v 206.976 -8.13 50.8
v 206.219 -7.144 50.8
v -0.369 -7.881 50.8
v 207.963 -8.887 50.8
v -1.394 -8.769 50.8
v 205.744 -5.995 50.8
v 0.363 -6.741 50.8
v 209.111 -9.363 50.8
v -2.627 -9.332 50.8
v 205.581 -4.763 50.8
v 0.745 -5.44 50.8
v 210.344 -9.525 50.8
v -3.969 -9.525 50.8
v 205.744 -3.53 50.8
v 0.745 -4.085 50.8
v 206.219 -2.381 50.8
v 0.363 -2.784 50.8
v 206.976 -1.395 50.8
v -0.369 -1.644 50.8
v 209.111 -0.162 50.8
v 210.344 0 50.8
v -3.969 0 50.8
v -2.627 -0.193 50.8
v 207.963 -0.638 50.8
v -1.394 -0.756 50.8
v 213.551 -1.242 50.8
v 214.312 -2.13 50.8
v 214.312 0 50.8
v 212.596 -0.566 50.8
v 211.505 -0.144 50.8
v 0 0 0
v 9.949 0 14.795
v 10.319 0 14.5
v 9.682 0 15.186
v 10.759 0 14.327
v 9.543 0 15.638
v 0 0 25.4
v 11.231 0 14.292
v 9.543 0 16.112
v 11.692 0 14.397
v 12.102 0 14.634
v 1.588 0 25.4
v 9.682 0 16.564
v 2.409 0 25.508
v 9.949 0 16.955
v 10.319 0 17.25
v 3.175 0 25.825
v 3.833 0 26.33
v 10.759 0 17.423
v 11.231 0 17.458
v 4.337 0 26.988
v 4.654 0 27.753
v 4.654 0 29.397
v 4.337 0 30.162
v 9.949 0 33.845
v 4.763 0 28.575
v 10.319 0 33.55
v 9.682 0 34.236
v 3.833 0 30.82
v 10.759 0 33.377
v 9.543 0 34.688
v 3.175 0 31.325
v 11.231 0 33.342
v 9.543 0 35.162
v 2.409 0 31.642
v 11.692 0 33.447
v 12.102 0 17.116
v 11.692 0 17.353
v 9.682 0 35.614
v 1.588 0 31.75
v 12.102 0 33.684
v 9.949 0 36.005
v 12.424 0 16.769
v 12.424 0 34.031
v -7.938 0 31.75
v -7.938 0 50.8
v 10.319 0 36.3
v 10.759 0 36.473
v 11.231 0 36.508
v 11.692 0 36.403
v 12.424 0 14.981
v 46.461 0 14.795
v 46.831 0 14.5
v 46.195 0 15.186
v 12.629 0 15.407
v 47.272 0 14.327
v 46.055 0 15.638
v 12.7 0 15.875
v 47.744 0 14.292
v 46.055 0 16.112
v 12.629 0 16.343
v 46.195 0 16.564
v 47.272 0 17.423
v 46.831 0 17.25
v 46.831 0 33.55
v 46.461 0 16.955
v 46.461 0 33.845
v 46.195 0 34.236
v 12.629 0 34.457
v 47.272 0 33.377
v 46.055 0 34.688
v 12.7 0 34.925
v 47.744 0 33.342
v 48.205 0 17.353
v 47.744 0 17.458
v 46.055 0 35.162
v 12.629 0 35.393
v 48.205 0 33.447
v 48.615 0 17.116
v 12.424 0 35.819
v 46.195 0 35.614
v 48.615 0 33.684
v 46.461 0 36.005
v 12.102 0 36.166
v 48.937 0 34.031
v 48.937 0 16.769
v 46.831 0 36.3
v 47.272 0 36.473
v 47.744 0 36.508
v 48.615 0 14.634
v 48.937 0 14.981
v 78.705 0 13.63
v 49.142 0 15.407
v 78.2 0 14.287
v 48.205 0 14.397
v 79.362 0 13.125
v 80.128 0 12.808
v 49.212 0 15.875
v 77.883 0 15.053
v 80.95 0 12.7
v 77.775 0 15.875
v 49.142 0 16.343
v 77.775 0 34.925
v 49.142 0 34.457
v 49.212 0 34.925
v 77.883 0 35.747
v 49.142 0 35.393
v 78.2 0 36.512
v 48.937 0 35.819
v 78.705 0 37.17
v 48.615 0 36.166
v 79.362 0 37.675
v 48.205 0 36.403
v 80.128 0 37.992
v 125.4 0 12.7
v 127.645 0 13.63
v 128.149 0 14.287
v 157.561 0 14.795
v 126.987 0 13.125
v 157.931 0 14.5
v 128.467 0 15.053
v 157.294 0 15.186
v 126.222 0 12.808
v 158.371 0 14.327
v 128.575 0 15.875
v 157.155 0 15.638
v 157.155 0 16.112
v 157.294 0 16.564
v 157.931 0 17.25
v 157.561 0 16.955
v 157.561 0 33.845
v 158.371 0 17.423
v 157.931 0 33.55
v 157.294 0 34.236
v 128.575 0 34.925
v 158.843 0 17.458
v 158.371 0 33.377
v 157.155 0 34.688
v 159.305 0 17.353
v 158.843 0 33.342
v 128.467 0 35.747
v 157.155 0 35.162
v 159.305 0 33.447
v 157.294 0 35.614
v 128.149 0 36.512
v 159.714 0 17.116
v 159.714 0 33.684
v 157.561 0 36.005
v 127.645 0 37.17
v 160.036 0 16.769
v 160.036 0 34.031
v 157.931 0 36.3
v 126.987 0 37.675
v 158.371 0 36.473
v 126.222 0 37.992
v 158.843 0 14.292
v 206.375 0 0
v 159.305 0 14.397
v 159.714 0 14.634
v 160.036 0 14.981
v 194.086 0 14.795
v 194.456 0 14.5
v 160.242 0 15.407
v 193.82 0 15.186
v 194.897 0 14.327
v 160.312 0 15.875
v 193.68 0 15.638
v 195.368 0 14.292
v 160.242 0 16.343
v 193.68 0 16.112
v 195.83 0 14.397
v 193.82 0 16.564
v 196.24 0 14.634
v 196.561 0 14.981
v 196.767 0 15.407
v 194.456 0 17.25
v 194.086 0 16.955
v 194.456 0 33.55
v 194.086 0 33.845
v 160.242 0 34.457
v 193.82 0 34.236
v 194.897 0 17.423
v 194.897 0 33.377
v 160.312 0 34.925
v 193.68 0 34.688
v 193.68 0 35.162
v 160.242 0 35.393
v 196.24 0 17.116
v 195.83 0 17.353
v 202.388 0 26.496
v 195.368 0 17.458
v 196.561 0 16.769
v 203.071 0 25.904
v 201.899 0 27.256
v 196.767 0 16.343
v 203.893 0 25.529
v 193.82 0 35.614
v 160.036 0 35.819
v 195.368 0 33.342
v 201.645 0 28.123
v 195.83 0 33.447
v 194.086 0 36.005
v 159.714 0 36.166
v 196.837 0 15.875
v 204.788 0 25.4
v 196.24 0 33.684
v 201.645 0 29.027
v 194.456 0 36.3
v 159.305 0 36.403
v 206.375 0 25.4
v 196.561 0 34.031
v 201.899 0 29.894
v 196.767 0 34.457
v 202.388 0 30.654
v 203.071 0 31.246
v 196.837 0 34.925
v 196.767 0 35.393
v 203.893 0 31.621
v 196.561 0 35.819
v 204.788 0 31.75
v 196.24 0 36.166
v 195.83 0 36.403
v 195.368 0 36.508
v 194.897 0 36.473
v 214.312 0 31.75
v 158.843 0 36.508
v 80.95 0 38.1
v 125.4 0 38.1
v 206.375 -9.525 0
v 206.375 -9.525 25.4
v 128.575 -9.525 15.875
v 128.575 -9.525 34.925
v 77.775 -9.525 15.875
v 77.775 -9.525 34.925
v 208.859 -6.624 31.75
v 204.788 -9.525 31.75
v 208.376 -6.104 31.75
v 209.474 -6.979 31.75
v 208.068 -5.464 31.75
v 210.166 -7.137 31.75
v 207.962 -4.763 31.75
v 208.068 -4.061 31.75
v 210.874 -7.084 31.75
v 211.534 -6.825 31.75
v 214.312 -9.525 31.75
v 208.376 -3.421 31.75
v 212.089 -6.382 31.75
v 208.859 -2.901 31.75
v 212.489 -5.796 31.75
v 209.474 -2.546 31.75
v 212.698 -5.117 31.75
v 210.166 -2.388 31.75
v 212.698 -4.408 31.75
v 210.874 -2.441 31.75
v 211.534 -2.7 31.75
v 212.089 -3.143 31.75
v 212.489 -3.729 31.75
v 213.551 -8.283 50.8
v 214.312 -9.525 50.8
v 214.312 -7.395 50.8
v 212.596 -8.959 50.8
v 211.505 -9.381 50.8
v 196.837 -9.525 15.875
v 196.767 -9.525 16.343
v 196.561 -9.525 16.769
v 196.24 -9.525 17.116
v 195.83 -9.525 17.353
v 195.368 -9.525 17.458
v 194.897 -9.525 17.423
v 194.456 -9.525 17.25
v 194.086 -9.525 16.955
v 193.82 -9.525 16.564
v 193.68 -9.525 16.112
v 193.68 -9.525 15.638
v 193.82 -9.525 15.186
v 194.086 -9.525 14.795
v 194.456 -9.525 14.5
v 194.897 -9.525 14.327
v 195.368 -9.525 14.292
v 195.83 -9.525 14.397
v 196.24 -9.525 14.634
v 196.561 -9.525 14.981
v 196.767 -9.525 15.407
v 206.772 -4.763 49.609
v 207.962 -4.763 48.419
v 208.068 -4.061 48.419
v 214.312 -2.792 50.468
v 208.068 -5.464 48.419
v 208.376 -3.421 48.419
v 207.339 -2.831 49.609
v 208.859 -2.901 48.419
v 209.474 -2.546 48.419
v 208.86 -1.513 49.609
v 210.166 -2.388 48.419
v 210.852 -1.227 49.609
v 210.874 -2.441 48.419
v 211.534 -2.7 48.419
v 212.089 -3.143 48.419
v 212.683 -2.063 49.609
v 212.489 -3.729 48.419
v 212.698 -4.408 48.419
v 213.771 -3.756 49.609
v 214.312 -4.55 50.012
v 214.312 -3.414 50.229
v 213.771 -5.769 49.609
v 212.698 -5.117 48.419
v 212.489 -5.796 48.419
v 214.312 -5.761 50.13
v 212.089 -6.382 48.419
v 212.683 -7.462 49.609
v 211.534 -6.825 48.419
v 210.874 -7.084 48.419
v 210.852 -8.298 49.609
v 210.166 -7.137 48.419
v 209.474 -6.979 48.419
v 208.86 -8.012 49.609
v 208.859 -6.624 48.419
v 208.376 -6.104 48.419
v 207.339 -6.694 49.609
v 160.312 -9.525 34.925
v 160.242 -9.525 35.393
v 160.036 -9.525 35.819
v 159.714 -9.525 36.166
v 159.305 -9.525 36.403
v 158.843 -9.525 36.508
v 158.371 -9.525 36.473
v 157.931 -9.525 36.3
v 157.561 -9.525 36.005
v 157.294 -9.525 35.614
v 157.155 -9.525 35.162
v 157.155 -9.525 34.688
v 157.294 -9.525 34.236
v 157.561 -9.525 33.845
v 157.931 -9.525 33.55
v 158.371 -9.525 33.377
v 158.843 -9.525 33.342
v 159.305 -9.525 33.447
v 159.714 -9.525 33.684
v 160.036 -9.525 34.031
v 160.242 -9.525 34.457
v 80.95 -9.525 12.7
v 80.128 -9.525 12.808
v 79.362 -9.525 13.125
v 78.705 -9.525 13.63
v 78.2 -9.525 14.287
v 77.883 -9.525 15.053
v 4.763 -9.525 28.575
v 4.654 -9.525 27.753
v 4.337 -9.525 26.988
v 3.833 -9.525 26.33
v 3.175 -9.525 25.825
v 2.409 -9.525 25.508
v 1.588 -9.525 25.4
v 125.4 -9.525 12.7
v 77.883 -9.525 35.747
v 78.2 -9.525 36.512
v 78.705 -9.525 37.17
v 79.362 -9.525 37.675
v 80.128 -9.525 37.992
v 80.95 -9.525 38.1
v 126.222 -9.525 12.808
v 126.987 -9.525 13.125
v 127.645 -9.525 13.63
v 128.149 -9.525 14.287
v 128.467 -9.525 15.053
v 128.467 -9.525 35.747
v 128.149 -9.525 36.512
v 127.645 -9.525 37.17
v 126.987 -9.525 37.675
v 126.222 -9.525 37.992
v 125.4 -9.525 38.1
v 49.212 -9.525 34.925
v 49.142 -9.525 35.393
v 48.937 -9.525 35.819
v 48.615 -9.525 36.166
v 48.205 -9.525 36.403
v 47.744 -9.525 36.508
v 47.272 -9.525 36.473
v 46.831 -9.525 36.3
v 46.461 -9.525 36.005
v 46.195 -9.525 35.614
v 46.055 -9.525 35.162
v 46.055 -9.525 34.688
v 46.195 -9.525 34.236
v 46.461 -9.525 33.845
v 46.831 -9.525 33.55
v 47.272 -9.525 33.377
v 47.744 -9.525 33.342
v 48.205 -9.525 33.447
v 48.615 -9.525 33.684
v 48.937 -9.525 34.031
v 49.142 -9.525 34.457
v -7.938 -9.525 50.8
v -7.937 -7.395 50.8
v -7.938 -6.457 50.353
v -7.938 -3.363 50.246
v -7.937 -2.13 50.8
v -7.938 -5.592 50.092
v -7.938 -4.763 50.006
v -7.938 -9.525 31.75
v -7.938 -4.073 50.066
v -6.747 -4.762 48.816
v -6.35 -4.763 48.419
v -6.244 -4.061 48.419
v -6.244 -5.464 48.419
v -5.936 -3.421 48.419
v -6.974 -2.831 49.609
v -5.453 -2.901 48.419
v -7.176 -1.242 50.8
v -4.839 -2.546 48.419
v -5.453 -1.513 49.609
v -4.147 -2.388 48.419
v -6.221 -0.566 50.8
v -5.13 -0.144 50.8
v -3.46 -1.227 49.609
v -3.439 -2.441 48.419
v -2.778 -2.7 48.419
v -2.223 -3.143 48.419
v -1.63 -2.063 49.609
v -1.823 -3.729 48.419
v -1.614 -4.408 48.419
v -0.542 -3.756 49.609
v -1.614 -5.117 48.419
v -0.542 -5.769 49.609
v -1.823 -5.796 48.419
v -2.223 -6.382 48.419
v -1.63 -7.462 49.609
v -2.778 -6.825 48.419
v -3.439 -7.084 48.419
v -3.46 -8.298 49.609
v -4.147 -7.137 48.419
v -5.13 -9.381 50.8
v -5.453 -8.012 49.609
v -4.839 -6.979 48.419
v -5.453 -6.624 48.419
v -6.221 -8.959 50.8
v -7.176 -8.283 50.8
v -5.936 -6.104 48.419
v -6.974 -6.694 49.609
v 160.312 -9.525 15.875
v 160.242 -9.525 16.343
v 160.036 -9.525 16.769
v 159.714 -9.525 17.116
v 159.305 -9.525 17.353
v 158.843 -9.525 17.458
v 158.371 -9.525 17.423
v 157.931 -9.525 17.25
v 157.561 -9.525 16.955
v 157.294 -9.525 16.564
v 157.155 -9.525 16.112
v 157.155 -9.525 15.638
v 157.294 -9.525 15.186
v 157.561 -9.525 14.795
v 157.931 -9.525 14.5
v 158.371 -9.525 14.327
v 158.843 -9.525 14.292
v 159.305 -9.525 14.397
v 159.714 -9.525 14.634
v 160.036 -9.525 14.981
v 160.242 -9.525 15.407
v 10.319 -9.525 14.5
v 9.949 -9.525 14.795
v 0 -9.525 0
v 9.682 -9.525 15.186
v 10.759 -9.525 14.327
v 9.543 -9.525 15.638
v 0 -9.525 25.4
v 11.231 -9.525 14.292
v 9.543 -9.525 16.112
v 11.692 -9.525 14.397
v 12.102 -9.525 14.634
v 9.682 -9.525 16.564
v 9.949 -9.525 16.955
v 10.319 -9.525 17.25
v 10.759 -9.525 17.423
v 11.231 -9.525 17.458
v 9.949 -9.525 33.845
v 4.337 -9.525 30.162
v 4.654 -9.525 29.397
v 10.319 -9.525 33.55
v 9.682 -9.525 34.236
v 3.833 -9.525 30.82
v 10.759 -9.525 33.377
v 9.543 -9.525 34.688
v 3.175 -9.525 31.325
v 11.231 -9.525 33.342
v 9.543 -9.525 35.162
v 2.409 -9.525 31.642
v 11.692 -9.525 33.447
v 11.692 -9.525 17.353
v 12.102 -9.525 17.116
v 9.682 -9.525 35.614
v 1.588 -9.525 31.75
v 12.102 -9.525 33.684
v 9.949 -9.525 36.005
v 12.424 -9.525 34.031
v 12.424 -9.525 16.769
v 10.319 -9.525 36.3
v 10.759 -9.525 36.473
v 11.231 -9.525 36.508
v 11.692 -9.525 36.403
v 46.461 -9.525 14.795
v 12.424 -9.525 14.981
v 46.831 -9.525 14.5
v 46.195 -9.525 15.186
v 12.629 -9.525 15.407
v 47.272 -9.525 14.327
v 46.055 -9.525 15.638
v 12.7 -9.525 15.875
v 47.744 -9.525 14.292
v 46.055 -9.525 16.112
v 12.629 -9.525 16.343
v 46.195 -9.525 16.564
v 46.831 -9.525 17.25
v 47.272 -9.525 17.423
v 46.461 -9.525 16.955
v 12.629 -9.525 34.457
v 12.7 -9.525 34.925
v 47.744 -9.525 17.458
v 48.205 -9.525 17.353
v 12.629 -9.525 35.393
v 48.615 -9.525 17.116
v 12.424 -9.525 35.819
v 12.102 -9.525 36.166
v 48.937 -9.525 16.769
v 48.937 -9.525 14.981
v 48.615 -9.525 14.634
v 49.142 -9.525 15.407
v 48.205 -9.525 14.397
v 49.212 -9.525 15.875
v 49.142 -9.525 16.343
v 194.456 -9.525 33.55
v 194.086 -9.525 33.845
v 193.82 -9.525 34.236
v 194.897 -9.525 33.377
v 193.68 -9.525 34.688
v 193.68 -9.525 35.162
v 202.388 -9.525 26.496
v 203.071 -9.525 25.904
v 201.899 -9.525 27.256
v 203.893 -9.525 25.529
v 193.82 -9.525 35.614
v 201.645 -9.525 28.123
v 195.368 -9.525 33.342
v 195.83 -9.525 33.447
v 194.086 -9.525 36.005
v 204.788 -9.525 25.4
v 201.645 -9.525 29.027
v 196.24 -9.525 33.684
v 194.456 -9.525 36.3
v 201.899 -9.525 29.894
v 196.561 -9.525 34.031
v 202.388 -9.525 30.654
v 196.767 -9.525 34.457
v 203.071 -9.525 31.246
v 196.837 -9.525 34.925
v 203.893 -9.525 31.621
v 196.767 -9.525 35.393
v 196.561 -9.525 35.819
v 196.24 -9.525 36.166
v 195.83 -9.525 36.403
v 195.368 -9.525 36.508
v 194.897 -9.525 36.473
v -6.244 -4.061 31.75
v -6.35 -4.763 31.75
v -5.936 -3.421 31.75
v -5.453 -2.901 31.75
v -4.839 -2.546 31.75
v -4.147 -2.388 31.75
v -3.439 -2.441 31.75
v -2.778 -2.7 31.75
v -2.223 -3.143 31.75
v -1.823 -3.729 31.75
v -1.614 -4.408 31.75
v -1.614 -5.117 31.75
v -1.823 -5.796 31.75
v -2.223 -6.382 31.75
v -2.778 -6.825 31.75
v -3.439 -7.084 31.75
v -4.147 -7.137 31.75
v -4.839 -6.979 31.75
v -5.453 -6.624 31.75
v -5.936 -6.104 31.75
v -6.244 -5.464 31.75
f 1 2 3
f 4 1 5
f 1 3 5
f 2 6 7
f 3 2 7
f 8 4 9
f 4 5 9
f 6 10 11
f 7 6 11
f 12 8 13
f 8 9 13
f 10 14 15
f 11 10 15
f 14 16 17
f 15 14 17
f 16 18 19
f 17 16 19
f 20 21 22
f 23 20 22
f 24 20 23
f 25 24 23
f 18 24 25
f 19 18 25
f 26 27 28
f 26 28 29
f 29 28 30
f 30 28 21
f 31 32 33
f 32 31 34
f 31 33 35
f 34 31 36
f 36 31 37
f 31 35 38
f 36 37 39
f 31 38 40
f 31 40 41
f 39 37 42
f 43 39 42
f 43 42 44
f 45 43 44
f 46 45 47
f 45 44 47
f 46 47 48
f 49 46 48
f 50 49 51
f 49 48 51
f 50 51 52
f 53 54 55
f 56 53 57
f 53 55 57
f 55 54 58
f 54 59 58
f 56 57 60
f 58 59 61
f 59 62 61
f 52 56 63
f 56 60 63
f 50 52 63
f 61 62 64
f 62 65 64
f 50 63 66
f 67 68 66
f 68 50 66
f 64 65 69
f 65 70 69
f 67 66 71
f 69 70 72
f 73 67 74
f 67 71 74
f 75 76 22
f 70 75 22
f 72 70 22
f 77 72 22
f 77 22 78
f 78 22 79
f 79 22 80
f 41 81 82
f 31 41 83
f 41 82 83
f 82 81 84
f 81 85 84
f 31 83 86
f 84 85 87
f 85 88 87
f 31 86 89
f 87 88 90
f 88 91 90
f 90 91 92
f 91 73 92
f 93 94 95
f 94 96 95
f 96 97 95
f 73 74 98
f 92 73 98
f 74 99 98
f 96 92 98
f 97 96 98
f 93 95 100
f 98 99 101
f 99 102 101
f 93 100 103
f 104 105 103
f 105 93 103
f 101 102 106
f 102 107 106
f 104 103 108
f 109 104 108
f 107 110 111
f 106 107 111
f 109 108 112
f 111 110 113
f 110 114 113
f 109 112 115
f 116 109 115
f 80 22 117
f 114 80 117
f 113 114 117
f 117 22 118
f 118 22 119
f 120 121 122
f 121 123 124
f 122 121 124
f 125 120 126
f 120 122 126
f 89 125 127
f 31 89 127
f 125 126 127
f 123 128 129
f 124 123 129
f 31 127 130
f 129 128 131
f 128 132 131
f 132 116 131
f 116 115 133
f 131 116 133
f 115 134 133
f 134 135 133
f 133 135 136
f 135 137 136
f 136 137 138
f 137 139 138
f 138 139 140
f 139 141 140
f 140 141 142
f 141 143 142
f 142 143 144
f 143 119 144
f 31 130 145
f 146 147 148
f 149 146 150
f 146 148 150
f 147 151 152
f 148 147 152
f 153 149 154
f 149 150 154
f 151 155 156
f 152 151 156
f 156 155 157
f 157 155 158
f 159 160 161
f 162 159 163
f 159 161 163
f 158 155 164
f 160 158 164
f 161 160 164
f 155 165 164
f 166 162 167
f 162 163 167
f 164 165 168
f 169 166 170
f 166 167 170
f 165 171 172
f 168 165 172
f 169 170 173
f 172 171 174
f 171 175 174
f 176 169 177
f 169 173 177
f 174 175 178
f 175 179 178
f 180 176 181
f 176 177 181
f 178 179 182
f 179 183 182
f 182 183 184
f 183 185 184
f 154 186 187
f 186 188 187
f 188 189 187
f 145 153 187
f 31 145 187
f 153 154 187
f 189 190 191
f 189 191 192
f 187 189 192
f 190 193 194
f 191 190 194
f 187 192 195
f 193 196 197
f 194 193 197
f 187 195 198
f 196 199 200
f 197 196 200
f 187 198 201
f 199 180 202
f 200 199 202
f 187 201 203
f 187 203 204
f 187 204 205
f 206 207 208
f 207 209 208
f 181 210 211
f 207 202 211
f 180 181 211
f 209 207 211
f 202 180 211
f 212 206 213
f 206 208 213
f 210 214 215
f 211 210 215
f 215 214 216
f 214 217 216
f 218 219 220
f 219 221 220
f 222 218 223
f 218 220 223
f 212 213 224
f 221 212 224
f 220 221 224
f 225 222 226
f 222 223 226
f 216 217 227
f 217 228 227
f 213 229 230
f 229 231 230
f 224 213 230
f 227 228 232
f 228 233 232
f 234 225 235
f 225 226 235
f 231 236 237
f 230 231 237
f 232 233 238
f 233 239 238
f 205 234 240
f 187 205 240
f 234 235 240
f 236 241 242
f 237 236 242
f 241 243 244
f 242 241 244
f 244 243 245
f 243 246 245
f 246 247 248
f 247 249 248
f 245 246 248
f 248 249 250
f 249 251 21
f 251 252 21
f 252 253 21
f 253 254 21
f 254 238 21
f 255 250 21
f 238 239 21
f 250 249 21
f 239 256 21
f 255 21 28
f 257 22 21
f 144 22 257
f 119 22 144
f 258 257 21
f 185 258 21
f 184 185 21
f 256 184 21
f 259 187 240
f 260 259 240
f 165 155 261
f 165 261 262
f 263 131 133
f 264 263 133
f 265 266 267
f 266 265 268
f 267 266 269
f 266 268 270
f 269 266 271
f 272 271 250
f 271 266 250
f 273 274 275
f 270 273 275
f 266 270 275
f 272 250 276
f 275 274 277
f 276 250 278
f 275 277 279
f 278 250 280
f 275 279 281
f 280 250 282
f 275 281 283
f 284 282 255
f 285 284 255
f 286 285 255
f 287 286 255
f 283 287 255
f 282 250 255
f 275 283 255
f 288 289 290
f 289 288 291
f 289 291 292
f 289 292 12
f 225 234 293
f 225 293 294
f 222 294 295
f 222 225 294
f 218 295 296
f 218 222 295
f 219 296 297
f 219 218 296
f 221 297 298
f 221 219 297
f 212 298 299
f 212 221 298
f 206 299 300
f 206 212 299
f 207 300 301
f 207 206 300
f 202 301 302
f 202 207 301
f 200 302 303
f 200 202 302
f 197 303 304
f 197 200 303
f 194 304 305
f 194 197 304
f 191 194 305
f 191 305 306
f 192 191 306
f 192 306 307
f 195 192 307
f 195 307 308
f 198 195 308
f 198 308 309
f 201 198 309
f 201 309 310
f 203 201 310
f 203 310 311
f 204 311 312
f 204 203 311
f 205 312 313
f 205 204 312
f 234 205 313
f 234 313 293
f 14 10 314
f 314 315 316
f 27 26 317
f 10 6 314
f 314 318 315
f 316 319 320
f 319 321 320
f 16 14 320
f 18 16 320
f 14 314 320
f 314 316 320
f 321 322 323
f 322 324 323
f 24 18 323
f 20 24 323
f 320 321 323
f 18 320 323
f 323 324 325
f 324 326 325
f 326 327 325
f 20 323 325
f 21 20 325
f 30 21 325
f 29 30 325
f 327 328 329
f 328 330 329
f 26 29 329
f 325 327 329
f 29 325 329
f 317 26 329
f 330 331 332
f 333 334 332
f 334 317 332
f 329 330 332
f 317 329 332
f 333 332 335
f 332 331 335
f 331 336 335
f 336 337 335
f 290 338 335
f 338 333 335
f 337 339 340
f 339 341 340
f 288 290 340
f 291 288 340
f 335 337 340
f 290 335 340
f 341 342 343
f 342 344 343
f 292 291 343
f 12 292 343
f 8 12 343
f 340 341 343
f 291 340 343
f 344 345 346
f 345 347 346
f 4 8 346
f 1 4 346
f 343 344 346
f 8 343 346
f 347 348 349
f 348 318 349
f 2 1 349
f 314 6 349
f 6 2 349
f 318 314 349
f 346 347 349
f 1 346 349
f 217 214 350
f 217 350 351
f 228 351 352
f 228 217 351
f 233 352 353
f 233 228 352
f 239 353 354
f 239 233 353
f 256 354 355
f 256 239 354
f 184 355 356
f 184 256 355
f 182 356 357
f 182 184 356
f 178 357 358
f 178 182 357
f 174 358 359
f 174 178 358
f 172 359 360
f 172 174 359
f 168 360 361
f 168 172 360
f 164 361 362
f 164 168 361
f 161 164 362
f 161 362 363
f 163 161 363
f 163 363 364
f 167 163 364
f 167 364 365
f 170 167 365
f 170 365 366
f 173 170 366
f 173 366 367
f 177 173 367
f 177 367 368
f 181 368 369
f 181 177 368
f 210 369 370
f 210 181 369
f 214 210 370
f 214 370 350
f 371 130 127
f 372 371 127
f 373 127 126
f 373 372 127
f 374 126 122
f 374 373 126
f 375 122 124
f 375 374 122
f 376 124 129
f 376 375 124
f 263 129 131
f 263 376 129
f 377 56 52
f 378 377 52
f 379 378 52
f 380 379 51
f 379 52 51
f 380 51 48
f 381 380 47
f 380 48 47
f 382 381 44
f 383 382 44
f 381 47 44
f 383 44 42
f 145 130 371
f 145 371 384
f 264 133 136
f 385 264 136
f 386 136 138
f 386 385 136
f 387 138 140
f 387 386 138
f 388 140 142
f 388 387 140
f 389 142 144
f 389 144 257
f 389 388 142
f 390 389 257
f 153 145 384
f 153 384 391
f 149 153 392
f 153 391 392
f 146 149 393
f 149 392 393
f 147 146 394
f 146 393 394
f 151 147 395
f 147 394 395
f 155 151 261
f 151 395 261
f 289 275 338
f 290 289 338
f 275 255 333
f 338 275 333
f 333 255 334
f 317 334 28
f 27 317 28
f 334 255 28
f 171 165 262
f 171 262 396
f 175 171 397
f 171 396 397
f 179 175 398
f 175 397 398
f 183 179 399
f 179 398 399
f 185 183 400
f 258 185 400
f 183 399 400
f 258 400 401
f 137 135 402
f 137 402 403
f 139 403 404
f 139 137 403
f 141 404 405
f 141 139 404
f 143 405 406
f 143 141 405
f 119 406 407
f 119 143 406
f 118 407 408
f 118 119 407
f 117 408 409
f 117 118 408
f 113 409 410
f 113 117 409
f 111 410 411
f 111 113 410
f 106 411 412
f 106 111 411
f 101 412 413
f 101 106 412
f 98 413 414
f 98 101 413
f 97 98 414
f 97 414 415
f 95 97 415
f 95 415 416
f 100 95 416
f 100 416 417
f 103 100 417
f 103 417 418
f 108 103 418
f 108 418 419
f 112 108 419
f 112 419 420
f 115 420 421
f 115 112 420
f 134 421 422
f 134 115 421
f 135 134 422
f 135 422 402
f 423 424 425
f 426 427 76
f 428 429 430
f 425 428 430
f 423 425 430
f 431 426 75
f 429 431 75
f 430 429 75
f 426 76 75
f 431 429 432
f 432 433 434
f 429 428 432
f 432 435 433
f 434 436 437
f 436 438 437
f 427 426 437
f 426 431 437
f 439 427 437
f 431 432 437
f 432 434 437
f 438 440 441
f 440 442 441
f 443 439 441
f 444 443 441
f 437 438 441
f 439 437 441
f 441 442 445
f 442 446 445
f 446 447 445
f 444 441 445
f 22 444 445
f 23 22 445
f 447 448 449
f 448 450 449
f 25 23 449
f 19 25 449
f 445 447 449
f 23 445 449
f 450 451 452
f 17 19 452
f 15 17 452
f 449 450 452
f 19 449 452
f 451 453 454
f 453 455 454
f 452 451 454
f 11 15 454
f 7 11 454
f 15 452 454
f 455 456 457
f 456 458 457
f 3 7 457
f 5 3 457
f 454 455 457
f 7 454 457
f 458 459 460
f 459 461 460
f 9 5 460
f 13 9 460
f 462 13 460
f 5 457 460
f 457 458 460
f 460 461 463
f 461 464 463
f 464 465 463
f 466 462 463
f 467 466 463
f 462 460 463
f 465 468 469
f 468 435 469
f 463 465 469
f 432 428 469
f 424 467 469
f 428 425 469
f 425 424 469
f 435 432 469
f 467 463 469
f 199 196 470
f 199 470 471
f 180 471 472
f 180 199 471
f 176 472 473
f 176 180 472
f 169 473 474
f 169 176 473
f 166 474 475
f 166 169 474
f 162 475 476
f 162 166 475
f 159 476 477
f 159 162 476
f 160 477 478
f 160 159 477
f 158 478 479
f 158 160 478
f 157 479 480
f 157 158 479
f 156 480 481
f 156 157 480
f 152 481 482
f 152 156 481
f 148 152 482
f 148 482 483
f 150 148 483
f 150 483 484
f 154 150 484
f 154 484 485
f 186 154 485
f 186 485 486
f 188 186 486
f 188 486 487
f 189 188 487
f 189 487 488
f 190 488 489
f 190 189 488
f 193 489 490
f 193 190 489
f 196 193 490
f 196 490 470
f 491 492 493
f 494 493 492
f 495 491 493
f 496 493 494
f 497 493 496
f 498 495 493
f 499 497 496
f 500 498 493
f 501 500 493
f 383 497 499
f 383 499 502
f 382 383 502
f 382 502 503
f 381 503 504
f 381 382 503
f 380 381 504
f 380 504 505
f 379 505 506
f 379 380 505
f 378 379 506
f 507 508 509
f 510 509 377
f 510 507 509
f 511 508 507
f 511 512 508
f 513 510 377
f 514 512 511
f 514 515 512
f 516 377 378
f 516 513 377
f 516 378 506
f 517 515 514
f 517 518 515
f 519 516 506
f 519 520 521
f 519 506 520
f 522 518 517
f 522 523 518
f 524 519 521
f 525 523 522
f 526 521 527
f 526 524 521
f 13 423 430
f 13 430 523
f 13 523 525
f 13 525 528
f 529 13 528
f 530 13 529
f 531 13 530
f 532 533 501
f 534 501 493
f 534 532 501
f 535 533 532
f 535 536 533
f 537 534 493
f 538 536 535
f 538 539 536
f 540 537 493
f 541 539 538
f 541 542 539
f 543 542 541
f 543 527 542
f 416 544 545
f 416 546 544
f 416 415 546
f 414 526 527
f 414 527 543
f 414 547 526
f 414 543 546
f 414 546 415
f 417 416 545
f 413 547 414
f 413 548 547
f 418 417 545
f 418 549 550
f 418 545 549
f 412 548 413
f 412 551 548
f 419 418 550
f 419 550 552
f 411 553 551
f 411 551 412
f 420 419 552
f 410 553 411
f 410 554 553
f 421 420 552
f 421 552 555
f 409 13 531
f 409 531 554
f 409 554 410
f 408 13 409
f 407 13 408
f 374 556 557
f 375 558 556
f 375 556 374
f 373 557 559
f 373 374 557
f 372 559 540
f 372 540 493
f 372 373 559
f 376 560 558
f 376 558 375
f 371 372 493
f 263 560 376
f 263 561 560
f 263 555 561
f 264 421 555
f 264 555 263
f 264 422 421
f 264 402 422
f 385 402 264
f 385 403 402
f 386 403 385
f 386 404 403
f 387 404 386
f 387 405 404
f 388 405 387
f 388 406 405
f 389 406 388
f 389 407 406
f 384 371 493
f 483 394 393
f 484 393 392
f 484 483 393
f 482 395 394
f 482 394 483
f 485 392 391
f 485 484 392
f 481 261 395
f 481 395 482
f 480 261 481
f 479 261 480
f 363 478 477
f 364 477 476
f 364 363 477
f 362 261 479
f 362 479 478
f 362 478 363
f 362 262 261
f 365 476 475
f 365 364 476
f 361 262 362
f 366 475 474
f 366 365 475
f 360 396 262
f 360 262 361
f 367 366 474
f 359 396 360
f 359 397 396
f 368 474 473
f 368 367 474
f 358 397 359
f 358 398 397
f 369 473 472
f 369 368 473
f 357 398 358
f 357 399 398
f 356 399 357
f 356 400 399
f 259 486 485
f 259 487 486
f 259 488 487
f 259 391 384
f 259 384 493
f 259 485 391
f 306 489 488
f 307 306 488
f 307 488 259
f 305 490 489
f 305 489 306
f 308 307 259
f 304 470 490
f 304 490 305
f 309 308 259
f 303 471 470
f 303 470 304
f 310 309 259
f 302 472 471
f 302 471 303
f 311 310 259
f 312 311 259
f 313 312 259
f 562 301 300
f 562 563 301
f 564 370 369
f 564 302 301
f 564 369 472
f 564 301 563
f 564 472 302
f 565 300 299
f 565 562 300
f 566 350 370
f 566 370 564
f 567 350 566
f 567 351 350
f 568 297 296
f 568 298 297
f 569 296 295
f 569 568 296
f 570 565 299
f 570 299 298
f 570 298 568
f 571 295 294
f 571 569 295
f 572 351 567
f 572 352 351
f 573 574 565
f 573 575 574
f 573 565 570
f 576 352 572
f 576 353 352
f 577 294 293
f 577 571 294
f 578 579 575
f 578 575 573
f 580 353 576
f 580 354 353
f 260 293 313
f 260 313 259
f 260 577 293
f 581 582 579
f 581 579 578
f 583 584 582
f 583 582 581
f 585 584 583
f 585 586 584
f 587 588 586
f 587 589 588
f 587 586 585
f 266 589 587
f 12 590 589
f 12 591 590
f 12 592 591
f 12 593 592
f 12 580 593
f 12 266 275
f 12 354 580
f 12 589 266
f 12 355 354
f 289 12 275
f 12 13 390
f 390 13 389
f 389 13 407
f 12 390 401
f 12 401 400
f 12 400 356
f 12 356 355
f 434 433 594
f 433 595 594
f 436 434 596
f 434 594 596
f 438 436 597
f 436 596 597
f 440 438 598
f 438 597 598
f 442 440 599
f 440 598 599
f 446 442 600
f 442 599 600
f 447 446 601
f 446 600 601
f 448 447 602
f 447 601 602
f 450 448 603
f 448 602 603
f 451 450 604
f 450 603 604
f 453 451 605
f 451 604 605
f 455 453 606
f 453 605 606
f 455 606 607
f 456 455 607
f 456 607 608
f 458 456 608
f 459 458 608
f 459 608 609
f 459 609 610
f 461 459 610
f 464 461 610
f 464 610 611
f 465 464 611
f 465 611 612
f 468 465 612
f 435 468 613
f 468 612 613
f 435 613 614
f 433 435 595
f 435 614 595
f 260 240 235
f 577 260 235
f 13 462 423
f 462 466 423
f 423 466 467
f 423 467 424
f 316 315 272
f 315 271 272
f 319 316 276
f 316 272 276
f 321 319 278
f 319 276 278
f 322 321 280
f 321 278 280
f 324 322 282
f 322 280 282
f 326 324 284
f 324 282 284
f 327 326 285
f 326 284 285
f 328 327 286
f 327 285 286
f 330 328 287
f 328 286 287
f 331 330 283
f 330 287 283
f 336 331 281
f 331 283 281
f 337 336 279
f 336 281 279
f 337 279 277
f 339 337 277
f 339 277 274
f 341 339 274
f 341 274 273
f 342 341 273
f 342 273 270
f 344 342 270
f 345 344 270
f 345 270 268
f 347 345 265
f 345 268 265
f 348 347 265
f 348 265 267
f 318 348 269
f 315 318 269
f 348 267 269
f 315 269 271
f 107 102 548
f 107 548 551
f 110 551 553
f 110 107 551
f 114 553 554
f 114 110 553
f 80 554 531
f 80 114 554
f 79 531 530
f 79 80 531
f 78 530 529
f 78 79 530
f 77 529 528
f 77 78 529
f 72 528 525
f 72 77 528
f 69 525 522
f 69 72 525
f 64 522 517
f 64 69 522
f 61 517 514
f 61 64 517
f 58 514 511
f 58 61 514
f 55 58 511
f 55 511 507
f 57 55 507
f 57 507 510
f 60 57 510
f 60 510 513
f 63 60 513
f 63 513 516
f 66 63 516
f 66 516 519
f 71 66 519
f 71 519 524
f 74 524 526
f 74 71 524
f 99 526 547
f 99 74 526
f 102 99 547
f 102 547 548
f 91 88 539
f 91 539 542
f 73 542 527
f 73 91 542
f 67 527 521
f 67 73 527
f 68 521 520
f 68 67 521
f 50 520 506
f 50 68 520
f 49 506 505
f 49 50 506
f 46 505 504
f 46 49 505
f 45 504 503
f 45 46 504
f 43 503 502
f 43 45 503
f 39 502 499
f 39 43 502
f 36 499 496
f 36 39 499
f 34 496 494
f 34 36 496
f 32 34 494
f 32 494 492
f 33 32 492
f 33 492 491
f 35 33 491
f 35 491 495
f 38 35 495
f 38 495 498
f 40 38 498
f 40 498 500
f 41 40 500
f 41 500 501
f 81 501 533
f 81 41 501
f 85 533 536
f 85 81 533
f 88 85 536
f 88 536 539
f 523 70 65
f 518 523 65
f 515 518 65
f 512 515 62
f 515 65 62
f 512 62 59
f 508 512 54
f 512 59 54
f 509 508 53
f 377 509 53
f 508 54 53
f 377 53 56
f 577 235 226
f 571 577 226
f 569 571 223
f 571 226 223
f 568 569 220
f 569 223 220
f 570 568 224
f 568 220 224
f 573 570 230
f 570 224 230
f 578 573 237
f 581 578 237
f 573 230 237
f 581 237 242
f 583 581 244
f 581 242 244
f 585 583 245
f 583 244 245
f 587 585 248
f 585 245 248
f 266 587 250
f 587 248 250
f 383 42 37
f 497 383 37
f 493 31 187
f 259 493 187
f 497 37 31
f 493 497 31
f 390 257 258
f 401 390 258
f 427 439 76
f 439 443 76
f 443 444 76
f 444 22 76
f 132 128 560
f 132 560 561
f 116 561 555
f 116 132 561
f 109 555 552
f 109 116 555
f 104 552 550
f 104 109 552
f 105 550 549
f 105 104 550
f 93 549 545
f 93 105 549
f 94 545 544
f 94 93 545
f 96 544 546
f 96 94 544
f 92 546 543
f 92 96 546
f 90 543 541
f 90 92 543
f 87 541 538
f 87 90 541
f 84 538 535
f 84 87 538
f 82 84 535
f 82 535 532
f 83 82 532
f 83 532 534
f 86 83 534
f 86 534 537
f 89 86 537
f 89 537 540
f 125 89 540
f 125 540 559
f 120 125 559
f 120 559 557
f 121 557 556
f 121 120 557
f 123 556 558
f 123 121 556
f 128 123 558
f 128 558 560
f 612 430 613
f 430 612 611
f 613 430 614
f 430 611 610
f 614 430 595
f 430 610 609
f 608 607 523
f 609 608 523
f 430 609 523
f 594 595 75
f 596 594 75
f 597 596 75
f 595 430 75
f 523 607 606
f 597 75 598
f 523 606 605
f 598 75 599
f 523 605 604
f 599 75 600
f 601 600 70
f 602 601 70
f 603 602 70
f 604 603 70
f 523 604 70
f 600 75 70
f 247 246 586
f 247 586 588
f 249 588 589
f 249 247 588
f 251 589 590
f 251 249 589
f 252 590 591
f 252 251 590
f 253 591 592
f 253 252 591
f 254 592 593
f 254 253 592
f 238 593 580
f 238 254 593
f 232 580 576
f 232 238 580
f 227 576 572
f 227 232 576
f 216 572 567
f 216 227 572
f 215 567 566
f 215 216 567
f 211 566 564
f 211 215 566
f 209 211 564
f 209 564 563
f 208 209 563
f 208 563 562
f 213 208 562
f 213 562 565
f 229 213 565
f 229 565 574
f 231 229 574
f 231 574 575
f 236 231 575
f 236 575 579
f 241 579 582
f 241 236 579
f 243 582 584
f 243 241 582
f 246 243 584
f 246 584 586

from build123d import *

# Parameters (mm, degrees)
F0_R           = 1.5875
F0_W           = 50.8
F0_H           = 25.4
F1_DEPTH       = 9.525
F2_R           = 3.175
F4_D           = 4.7625
F4_CSINK_D     = 9.525
F4_CSINK_ANGLE = 90


with BuildPart() as f1:
    # F0 (on Front) → F1 (new body)
    with BuildSketch(Plane.XZ):
        with BuildLine():
            Line((0, 25.4), (0, 0))
            Line((0, 0), (206.375, 0))
            Line((206.375, 0), (206.375, 25.4))
            Line((206.375, 25.4), (204.7875, 25.4))
            ThreePointArc((204.7875, 25.4), (201.6125, 28.575), (204.7875, 31.75))
            Line((204.7875, 31.75), (206.375, 31.75))
            Line((206.375, 31.75), (214.3125, 31.75))
            Line((214.3125, 31.75), (214.3125, 50.8))
            Line((214.3125, 50.8), (206.375, 50.8))
            Line((206.375, 50.8), (0, 50.8))
            Line((0, 50.8), (-7.9375, 50.8))
            Line((-7.9375, 50.8), (-7.9375, 31.75))
            Line((-7.9375, 31.75), (0, 31.75))
            Line((0, 31.75), (1.5875, 31.75))
            ThreePointArc((1.5875, 31.75), (3.832564, 30.820064), (4.7625, 28.575))
            ThreePointArc((4.7625, 28.575), (3.832564, 26.329936), (1.5875, 25.4))
            Line((1.5875, 25.4), (0, 25.4))
        make_face()
        with Locations((11.1125, 15.875)):
            Circle(F0_R, mode=Mode.SUBTRACT)
        with Locations((47.625, 15.875)):
            Circle(F0_R, mode=Mode.SUBTRACT)
        with Locations((103.1748, 25.4)):
            Rectangle(F0_W, F0_H, mode=Mode.SUBTRACT)
        with Locations((158.7246, 15.875)):
            Circle(F0_R, mode=Mode.SUBTRACT)
        with Locations((195.2498, 15.875)):
            Circle(F0_R, mode=Mode.SUBTRACT)
        with Locations((11.1125, 34.925)):
            Circle(F0_R, mode=Mode.SUBTRACT)
        with Locations((47.625, 34.925)):
            Circle(F0_R, mode=Mode.SUBTRACT)
        with Locations((158.7246, 34.925)):
            Circle(F0_R, mode=Mode.SUBTRACT)
        with Locations((195.2498, 34.925)):
            Circle(F0_R, mode=Mode.SUBTRACT)
    extrude(amount=F1_DEPTH)

    # F2
    f2_edges = [f1.edges().sort_by_distance(p)[0] for p in [
        (77.7748, -4.7625, 12.7),
        (128.5748, -4.7625, 12.7),
        (77.7748, -4.7625, 38.1),
        (128.5748, -4.7625, 38.1),
    ]]
    fillet(f2_edges, radius=F2_R)

    # F4 (through all)
    with Locations(Plane.XY.offset(50.8)):
        with Locations((-3.96875, -4.7625), (210.34375, -4.7625)):
            CounterSinkHole(F4_D / 2, F4_CSINK_D / 2, counter_sink_angle=F4_CSINK_ANGLE)


solid = f1.part
